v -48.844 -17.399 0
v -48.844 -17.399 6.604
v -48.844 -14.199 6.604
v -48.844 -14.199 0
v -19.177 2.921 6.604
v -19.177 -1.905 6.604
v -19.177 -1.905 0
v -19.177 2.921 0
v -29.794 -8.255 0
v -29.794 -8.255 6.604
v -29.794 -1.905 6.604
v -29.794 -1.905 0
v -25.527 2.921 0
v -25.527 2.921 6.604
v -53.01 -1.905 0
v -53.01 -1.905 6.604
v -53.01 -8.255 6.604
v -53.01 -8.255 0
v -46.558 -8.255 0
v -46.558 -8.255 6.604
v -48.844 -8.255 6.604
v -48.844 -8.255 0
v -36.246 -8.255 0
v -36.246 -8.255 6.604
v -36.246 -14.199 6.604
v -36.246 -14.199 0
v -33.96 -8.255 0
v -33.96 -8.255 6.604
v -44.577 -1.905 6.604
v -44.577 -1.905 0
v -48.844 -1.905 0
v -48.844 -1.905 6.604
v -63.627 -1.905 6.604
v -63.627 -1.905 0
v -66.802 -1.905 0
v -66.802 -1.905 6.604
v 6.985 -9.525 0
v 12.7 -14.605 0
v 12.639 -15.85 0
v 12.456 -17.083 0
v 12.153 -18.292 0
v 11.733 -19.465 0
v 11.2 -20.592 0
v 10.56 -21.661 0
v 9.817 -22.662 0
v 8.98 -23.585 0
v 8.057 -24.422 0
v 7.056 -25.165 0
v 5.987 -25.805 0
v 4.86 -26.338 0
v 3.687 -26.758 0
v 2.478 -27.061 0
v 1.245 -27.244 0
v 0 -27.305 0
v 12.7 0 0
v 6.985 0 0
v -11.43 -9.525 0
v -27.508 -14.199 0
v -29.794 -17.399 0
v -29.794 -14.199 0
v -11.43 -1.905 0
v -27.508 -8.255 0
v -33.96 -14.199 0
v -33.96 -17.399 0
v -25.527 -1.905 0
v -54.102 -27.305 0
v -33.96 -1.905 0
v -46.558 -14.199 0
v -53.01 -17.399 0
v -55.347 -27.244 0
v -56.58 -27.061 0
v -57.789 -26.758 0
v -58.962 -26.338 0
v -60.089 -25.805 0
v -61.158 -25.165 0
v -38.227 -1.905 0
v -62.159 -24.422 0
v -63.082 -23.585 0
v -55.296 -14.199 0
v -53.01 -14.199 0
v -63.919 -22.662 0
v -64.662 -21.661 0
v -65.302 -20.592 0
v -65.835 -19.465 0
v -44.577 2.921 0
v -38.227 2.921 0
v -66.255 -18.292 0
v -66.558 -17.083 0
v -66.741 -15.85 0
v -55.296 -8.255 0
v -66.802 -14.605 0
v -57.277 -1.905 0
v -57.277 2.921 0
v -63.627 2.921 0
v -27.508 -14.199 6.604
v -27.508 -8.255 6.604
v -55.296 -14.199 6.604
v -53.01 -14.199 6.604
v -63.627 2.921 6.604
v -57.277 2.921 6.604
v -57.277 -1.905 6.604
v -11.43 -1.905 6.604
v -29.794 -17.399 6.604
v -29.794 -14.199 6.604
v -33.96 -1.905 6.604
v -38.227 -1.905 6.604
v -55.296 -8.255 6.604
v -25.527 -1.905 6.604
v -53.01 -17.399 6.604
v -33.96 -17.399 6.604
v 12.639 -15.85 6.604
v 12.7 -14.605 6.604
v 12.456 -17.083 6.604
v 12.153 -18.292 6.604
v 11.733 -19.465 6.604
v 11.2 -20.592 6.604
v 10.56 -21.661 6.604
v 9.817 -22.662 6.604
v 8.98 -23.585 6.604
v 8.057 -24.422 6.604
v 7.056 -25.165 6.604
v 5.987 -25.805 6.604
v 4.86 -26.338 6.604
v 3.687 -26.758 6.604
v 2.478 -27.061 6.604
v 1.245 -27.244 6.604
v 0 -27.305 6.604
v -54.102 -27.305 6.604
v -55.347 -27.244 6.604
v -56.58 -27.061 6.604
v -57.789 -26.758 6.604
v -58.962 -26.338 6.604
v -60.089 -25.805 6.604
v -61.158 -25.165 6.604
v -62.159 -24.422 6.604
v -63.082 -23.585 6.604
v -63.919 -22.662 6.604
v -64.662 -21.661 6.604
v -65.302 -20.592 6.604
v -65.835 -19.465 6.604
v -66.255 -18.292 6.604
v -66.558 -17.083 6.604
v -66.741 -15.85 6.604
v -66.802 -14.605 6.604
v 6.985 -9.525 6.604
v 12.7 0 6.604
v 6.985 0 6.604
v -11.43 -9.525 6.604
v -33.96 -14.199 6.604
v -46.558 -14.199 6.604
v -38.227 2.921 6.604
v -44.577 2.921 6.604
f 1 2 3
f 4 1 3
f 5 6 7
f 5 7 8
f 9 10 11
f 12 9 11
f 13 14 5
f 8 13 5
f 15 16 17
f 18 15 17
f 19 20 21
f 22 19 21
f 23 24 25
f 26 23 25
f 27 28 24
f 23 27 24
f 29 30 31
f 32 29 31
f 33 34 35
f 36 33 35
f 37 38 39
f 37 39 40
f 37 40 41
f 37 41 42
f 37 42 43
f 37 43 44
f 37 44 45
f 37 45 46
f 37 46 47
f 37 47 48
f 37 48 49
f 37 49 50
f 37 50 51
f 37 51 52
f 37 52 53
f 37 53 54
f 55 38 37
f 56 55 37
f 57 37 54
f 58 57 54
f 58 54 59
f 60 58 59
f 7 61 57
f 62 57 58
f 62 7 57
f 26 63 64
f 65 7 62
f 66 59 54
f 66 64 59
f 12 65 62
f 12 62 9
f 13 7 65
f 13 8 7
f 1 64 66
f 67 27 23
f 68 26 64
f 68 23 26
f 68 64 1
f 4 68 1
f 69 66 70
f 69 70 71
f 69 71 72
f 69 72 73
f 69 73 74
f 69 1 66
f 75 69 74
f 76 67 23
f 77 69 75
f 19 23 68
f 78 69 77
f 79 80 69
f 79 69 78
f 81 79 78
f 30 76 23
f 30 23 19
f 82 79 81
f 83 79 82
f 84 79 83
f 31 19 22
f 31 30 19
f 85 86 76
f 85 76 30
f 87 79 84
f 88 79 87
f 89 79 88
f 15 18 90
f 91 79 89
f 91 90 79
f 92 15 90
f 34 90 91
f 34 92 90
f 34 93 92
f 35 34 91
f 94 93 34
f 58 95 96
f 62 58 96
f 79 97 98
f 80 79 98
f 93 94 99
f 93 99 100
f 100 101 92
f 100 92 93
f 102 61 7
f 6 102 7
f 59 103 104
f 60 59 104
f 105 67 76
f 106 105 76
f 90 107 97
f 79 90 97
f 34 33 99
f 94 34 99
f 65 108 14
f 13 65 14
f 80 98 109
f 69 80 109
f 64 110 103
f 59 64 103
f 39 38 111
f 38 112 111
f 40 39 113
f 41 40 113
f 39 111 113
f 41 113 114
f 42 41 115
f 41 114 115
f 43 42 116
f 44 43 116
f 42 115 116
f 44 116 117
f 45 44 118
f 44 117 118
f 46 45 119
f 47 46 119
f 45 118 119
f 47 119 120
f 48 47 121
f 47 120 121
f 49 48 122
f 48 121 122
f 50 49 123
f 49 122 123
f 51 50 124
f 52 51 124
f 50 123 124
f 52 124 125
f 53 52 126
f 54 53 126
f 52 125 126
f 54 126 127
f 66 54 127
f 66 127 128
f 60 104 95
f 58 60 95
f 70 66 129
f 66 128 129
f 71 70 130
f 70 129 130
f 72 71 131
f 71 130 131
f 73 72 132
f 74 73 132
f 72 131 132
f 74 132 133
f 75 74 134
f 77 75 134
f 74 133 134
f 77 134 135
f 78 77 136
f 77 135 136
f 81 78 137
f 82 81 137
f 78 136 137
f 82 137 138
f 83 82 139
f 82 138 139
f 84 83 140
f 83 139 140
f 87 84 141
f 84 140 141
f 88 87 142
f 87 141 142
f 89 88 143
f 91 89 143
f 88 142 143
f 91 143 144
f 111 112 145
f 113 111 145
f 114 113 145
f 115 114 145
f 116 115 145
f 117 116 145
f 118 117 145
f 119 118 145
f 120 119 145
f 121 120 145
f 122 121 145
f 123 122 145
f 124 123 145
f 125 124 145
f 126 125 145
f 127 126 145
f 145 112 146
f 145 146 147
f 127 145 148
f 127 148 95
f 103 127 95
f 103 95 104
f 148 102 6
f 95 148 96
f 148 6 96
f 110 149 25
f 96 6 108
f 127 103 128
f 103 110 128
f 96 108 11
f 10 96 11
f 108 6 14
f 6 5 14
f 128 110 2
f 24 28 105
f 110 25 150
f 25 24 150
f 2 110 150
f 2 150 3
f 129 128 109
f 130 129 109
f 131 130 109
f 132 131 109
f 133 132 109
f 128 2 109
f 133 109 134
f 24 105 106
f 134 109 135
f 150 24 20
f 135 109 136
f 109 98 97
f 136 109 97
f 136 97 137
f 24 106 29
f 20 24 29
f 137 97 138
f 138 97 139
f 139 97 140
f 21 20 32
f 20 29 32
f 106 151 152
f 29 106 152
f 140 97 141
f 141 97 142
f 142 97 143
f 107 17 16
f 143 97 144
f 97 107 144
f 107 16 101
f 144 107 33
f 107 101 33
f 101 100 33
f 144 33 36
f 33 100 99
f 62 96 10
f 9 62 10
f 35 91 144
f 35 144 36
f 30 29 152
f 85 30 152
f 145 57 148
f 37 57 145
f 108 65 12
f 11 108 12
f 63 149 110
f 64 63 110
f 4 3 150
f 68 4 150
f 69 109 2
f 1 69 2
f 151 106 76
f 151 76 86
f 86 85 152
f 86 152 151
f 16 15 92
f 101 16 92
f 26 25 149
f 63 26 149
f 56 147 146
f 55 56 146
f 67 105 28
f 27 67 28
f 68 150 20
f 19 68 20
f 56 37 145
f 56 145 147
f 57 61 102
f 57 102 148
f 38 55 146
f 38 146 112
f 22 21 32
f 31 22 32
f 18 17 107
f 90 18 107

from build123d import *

# Parameters (mm, degrees)
BOSS_EXTRUDE1_DEPTH = 6.604
FILLET1_R           = 12.7
CUT_EXTRUDE1_DEPTH  = 7.604
SKETCH3_W           = 6.35
SKETCH3_H           = 4.826
BOSS_EXTRUDE2_DEPTH = 6.604


with BuildPart() as part:
    # Sketch1 → Boss-Extrude1 (new body)
    with BuildSketch(Plane.XY):
        Polygon((-11.43, -1.905), (-11.43, -9.525), (6.985, -9.525), (6.985, 0), (12.7, 0), (12.7, -27.305), (-66.802, -27.305), (-66.802, -1.905), (-12.827, -1.905), align=None)
    extrude(amount=BOSS_EXTRUDE1_DEPTH)

    # Fillet1
    fillet1_edges = [part.edges().sort_by_distance(p)[0] for p in [
        (12.7, -27.305, 3.302),
        (-66.802, -27.305, 3.302),
    ]]
    fillet(fillet1_edges, radius=FILLET1_R)

    # Sketch2 → Cut-Extrude1 (cut, through all)
    with BuildSketch(Plane.XY.offset(6.604)):
        Polygon((-53.0098, -1.905), (-53.0098, -8.255), (-55.2958, -8.255), (-55.2958, -14.1986), (-53.0098, -14.1986), (-53.0098, -17.399), (-48.8442, -17.399), (-48.8442, -14.1986), (-46.5582, -14.1986), (-46.5582, -8.255), (-48.8442, -8.255), (-48.8442, -1.905), align=None)
        Polygon((-33.9598, -1.905), (-33.9598, -8.255), (-36.2458, -8.255), (-36.2458, -14.1986), (-33.9598, -14.1986), (-33.9598, -17.399), (-29.7942, -17.399), (-29.7942, -14.1986), (-27.5082, -14.1986), (-27.5082, -8.255), (-29.7942, -8.255), (-29.7942, -1.905), align=None)
    extrude(amount=-CUT_EXTRUDE1_DEPTH, mode=Mode.SUBTRACT)

    # Sketch3 → Boss-Extrude2 (add)
    with BuildSketch(Plane.XY.offset(6.604)):
        with Locations((-60.452, 0.508)):
            Rectangle(SKETCH3_W, SKETCH3_H)
        with Locations((-41.402, 0.508)):
            Rectangle(SKETCH3_W, SKETCH3_H)
        with Locations((-22.352, 0.508)):
            Rectangle(SKETCH3_W, SKETCH3_H)
    extrude(amount=-BOSS_EXTRUDE2_DEPTH)


solid = part.part
